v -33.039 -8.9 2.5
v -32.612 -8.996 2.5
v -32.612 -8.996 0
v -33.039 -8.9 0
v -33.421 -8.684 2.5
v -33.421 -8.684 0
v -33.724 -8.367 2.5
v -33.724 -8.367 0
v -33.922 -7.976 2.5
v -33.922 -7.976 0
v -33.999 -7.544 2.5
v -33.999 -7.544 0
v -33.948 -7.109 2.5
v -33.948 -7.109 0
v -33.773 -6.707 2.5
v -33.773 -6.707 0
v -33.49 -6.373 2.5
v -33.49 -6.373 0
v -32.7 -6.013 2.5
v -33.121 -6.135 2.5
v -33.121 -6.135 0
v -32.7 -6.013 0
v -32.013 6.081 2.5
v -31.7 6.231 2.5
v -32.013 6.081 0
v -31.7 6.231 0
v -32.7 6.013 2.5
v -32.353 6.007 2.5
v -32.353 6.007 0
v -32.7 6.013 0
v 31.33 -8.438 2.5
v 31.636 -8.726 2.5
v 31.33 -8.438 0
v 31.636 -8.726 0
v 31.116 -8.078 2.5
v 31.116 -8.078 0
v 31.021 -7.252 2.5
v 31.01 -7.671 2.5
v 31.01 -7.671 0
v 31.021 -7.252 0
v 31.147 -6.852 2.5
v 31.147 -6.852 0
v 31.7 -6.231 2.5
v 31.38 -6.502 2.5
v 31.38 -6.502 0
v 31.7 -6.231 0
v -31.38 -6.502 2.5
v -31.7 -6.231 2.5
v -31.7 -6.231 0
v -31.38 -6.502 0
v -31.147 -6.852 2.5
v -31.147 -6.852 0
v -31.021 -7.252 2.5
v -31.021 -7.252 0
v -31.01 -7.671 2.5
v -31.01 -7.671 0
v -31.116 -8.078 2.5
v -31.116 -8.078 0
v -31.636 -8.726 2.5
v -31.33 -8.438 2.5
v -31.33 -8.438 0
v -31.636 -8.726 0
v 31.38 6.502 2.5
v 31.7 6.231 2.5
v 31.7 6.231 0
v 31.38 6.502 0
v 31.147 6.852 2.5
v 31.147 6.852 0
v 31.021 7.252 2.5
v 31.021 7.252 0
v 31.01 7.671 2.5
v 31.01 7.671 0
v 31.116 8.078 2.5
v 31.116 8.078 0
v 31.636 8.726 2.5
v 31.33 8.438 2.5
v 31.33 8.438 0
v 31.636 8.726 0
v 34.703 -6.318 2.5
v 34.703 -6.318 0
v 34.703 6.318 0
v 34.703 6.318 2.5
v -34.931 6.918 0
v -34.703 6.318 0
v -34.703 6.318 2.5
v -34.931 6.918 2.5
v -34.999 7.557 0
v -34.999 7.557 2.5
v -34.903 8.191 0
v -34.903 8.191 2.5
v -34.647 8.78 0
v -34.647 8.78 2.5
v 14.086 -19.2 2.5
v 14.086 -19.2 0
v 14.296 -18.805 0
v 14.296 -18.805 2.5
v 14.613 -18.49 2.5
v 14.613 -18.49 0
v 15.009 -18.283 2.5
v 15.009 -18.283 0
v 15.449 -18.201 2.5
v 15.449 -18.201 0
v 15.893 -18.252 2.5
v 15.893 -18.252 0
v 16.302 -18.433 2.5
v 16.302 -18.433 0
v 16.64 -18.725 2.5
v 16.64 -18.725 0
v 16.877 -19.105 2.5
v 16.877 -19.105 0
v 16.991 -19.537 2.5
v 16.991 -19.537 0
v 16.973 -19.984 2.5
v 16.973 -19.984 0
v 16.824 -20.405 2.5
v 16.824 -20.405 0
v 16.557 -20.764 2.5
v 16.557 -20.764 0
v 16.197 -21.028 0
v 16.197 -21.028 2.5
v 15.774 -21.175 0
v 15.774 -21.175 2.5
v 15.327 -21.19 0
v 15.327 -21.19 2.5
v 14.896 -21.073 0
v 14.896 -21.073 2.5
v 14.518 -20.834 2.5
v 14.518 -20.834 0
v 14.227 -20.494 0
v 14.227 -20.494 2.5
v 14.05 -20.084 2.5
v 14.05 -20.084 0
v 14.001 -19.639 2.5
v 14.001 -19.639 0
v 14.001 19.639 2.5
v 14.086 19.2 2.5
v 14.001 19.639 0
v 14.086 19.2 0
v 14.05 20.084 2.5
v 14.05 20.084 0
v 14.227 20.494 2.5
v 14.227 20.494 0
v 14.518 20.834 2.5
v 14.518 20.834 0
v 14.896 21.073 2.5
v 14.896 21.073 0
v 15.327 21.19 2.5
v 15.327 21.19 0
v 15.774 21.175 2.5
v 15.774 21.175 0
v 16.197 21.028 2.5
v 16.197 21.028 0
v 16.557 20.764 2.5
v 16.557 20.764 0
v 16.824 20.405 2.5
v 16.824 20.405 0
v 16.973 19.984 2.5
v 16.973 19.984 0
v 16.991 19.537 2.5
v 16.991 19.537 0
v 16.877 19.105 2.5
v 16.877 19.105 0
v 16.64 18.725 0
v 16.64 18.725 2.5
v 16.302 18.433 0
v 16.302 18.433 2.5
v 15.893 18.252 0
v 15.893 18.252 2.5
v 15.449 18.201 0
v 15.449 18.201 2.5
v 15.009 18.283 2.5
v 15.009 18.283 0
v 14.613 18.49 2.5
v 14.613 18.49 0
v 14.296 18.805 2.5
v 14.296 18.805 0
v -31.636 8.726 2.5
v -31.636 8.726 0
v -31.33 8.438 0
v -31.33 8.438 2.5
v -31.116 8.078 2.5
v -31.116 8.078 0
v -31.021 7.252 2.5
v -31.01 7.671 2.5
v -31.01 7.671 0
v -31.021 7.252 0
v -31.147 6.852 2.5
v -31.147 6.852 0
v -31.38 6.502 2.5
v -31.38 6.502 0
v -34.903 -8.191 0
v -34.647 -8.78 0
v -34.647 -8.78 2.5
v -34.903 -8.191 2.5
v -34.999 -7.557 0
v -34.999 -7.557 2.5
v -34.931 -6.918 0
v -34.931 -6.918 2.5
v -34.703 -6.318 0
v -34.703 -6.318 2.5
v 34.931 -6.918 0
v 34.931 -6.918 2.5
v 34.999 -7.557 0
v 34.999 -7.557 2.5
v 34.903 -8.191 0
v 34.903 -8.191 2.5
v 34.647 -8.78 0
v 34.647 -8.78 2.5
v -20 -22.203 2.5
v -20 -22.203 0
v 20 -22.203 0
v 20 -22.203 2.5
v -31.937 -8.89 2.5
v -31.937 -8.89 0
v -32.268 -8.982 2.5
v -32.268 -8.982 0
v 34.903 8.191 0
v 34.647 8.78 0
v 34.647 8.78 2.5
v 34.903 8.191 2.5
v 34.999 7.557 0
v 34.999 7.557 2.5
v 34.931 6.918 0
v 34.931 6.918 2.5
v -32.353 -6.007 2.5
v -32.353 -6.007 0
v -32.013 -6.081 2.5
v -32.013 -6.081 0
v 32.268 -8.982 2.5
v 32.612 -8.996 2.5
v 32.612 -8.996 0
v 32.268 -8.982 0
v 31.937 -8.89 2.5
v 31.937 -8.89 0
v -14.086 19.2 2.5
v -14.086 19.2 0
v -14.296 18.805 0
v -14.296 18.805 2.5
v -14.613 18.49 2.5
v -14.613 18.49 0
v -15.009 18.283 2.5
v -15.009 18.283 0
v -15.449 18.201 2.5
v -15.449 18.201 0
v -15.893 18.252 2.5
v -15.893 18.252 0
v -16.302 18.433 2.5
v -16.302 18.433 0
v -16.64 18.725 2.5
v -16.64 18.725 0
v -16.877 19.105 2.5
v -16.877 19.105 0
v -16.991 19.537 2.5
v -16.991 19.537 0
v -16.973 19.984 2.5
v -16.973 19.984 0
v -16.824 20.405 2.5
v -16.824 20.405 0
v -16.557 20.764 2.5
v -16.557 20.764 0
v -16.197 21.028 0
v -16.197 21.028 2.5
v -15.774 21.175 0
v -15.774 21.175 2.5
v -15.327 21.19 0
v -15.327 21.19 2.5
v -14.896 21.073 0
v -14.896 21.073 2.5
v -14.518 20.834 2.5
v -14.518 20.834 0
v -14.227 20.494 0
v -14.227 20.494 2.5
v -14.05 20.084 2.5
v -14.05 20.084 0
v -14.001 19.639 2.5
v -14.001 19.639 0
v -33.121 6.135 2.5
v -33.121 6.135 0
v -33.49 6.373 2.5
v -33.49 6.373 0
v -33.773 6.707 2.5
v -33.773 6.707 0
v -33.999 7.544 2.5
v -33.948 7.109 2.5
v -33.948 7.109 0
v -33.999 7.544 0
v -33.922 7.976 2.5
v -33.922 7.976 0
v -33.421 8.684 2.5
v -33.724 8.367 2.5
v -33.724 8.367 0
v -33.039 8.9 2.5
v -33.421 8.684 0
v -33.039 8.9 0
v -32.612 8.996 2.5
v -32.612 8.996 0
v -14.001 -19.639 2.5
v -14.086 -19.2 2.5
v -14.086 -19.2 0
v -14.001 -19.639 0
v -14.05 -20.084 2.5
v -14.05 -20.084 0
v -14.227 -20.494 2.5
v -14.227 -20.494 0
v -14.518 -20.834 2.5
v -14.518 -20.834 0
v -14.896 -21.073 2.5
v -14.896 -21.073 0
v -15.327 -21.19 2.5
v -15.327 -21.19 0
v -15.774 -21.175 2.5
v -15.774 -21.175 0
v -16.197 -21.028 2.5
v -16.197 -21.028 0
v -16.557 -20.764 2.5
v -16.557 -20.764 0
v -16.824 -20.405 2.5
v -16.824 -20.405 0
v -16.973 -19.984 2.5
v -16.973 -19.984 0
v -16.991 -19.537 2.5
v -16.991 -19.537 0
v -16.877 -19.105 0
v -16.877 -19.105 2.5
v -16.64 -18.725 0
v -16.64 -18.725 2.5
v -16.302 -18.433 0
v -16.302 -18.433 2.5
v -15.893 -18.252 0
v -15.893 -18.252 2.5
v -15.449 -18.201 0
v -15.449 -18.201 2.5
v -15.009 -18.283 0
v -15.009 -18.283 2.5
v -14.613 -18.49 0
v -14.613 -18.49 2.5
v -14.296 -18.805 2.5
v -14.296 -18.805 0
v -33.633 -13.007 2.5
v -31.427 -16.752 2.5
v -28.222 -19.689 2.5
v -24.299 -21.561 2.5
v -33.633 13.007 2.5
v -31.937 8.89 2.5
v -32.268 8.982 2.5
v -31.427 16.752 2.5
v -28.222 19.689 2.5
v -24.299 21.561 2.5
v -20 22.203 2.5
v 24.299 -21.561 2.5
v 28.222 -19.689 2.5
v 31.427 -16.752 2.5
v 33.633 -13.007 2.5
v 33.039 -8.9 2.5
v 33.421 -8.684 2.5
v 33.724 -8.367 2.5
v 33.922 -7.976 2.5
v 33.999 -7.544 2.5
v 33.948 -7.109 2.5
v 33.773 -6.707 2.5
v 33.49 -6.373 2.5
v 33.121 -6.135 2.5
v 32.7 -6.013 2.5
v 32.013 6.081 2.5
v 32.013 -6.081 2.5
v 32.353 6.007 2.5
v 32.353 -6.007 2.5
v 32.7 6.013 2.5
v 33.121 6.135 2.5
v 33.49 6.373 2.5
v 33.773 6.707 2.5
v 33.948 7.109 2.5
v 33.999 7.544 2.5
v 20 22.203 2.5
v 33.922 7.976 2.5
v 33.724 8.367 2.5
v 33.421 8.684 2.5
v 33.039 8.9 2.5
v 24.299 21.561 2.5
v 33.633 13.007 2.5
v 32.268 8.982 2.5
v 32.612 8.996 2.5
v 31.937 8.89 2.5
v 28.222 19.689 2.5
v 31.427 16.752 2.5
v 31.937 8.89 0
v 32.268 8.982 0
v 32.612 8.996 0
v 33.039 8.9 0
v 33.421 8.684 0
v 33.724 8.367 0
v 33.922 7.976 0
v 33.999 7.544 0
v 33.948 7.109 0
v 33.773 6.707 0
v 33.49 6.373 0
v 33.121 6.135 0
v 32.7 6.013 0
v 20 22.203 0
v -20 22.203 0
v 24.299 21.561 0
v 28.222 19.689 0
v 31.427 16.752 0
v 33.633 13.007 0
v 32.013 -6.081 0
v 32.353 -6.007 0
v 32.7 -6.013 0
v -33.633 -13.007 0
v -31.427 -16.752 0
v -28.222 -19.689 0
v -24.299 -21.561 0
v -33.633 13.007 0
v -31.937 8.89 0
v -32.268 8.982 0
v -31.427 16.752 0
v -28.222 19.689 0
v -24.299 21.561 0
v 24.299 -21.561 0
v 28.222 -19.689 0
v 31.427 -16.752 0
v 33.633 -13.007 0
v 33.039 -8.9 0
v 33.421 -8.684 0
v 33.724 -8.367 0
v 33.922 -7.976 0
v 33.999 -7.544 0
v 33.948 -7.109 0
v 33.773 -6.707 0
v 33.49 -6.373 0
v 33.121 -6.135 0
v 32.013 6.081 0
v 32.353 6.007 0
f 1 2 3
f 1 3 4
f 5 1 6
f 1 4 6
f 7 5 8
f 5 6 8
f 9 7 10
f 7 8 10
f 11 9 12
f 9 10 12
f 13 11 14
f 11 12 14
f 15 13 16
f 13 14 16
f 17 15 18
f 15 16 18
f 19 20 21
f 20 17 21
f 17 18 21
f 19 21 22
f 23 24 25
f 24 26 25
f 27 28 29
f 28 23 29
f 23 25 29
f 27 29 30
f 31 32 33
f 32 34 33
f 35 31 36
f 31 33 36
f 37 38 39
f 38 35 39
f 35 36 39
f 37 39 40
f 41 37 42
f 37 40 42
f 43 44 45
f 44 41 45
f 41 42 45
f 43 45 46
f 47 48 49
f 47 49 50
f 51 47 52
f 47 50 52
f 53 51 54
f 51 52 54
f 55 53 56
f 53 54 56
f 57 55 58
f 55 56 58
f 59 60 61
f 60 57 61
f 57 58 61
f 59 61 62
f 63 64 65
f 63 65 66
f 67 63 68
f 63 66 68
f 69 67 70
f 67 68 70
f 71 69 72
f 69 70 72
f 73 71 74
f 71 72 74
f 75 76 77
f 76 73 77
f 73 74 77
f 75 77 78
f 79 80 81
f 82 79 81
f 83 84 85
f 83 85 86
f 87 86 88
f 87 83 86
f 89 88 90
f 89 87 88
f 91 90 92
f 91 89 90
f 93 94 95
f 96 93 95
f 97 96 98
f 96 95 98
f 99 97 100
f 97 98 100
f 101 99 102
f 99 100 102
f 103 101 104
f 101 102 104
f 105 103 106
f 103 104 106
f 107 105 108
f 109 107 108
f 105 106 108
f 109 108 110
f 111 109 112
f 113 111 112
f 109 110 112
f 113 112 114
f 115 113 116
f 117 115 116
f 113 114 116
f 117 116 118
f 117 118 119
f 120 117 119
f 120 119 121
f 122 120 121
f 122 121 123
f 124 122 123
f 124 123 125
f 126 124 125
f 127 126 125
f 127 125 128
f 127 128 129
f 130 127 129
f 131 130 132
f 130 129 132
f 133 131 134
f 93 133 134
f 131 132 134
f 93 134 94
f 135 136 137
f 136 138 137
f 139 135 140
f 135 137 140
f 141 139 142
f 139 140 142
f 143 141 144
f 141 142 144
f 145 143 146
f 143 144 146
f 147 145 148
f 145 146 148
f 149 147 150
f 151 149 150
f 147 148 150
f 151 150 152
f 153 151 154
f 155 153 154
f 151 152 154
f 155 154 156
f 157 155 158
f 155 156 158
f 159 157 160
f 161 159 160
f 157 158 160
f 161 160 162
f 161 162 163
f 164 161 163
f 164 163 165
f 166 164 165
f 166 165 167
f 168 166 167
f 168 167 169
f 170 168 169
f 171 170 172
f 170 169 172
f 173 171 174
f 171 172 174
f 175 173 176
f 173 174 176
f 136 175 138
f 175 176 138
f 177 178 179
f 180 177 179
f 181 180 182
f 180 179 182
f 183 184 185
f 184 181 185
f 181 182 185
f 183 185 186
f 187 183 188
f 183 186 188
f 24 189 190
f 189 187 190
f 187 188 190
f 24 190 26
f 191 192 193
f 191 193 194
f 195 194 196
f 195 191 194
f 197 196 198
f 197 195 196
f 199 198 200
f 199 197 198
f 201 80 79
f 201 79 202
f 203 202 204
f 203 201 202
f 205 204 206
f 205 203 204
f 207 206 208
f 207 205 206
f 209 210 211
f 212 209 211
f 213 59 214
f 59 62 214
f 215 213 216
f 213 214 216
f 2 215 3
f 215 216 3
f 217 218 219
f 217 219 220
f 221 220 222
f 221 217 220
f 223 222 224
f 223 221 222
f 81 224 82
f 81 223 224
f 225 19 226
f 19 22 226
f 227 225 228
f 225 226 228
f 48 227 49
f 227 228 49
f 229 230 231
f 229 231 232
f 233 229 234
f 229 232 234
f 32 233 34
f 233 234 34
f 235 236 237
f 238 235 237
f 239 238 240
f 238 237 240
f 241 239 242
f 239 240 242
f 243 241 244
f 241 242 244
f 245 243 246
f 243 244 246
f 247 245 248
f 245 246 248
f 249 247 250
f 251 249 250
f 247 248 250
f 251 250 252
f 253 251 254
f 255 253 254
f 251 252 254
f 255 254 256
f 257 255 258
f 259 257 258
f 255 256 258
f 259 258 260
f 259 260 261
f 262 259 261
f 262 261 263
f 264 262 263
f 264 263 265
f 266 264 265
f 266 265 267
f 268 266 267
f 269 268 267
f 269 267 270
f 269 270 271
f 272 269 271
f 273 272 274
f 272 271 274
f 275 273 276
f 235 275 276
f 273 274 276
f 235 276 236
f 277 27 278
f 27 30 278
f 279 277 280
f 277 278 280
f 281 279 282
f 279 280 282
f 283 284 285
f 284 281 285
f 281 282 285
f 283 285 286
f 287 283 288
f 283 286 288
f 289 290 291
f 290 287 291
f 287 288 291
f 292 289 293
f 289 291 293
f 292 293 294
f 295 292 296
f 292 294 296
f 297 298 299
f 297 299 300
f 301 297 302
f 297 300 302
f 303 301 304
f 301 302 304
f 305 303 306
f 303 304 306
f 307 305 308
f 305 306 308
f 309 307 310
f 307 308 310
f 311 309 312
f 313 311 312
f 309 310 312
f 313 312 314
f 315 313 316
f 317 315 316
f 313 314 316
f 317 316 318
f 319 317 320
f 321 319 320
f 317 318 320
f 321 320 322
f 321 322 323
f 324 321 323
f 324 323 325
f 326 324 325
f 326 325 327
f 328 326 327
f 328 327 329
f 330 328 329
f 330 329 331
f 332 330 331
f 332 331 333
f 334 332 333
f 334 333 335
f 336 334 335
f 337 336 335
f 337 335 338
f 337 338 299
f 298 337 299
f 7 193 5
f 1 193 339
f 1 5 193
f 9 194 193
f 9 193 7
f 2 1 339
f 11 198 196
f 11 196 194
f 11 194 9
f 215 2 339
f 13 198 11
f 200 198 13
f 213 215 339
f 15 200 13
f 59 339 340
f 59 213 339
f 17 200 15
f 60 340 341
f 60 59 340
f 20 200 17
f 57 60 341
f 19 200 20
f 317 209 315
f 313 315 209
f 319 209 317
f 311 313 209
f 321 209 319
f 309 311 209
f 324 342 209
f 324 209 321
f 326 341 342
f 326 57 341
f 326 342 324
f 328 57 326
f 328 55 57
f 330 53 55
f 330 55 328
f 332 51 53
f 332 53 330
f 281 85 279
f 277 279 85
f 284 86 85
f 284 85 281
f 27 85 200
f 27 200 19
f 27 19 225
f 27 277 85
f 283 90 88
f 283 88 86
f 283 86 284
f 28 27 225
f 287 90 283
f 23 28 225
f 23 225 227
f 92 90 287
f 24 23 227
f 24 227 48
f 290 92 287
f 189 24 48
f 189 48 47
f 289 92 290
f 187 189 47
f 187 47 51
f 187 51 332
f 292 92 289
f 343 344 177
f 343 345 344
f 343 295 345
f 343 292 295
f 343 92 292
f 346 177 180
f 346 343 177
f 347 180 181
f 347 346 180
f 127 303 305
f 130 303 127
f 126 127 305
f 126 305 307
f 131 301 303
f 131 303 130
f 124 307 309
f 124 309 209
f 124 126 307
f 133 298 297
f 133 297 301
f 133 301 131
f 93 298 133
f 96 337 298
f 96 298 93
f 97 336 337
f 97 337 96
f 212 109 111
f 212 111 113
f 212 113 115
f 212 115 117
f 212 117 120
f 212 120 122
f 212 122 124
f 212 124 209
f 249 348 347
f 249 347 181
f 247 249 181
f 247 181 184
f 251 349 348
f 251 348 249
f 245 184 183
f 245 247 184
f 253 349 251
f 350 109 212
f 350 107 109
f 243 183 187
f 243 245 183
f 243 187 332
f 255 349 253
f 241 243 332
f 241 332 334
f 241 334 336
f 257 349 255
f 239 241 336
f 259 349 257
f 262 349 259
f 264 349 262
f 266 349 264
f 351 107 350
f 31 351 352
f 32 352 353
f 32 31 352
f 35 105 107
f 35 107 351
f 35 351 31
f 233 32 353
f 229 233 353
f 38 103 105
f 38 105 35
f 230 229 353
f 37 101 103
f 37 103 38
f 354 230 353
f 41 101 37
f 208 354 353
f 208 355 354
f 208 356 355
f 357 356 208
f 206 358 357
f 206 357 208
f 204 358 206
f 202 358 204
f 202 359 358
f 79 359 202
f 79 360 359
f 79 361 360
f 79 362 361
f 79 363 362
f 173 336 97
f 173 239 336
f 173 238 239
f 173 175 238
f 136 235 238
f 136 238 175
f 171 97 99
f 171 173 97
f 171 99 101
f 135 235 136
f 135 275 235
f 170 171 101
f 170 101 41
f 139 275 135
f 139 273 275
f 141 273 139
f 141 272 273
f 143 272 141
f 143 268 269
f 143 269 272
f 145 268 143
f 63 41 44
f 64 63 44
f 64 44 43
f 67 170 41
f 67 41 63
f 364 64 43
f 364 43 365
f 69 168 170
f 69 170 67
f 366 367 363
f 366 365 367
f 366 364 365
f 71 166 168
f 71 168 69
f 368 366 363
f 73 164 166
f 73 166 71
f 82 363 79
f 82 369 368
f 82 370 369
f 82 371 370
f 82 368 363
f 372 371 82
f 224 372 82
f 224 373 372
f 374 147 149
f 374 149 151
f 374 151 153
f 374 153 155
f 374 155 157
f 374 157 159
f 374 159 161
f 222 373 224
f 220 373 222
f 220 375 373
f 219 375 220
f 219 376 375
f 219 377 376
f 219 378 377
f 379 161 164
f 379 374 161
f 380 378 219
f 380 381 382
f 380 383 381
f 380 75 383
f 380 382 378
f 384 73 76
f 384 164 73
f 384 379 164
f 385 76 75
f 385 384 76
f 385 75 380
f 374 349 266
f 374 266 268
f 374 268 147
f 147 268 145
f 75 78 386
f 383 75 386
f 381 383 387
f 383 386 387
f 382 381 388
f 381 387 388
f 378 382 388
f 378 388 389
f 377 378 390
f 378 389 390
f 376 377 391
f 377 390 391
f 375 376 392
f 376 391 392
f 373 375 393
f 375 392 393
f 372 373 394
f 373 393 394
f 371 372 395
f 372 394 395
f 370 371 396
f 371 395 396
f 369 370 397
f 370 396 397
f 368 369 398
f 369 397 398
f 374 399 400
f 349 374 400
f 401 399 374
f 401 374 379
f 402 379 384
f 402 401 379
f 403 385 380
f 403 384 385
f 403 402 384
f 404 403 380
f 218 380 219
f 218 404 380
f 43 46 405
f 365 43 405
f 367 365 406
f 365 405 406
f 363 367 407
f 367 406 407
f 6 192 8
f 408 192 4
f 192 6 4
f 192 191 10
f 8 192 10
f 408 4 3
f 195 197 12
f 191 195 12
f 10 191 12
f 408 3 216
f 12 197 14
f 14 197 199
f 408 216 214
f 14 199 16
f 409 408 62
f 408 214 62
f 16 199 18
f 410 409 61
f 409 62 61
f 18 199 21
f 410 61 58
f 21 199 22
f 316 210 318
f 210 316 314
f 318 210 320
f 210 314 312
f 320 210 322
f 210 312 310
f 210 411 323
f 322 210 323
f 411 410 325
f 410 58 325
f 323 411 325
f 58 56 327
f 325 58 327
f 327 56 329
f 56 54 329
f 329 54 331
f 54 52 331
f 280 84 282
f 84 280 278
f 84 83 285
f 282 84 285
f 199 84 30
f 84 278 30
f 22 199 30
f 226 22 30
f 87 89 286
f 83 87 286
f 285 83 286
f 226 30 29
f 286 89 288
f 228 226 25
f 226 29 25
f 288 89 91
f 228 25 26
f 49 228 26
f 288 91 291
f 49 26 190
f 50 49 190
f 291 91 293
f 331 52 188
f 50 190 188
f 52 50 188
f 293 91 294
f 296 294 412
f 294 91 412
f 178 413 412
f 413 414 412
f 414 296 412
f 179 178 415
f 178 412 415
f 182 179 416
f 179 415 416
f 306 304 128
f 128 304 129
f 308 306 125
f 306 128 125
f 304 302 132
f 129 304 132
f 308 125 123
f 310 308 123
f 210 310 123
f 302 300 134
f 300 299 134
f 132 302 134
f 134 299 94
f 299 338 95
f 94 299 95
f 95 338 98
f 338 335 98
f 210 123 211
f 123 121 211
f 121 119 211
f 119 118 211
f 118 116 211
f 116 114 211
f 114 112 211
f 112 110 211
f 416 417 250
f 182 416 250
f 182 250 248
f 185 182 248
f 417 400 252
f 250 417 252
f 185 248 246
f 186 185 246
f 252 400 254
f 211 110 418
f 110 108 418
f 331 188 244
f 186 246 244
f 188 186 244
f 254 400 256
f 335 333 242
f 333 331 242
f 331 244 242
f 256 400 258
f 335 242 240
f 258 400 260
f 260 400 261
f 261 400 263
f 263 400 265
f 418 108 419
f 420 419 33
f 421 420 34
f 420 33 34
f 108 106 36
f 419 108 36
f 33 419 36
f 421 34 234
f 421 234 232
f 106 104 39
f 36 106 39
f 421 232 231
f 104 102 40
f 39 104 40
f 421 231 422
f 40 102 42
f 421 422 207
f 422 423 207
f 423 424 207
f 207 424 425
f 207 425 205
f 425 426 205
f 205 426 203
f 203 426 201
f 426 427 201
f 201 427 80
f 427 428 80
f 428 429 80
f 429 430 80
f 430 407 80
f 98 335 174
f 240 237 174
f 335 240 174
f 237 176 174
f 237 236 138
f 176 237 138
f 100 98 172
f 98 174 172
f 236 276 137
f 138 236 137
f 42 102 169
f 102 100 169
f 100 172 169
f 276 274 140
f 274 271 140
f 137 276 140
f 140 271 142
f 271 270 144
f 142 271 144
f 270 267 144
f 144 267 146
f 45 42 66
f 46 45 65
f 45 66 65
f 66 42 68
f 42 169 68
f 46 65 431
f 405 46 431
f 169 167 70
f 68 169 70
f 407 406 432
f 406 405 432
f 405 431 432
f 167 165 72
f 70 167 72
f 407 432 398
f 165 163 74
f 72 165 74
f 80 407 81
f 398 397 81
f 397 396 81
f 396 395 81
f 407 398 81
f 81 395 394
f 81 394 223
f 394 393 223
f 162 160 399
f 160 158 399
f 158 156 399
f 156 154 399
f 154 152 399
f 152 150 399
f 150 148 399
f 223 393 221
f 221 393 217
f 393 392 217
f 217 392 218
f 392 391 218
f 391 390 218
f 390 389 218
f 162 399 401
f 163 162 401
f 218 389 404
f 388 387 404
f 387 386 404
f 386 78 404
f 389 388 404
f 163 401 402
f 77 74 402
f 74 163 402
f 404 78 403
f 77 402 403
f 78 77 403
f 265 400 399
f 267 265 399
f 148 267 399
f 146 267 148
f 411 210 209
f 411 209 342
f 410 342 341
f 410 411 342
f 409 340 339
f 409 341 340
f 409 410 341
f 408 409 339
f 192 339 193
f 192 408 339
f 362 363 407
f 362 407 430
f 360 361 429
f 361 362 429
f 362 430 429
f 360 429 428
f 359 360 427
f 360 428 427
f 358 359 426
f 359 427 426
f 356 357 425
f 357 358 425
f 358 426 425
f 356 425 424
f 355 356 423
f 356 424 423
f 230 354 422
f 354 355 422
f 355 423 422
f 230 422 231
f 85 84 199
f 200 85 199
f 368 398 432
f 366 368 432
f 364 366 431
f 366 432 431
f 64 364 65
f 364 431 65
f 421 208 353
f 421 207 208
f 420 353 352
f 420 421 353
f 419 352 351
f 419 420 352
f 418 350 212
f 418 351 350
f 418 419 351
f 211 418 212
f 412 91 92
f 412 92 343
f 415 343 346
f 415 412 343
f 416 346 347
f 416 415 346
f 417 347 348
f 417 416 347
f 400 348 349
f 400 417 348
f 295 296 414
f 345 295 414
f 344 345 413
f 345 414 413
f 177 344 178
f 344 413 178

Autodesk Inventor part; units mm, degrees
ref_plane "YZ Plane" through (0, 0, 0) normal (1, 0, 0) x (0, 1, 0)
ref_plane "XZ Plane" through (0, 0, 0) normal (0, 1, 0) x (-1, 0, 0)
ref_plane "XY Plane" through (0, 0, 0) normal (0, 0, 1) x (1, 0, 0)
sketch "Sketch1" plane through (0, 0, 0) normal (0, 0, 1) x (1, 0, 0)
  line L0 (-32.7, -6.0134) -> (-32.7, 6.0134) projected
  arc A0 (-32.6116, 8.9958) -> (-32.7, 6.0134) centre (-32.5, 7.5) ccw projected
  arc A1 (-20, 20.2) -> (-32.6116, 8.9958) centre (-20, 7.5) ccw projected
  line L1 (-20, 20.2) -> (-16.9142, 20.2) projected
  arc A2 (-14.0858, 20.2) -> (-16.9142, 20.2) centre (-15.5, 19.7) ccw projected
  line L2 (-14.0858, 20.2) -> (14.0858, 20.2) projected
  arc A3 (16.9142, 20.2) -> (14.0858, 20.2) centre (15.5, 19.7) ccw projected
  line L3 (16.9142, 20.2) -> (20, 20.2) projected
  arc A4 (32.6116, 8.9958) -> (20, 20.2) centre (20, 7.5) ccw projected
  arc A5 (32.7, 6.0134) -> (32.6116, 8.9958) centre (32.5, 7.5) ccw projected
  line L4 (32.7, 6.0134) -> (32.7, -6.0134) projected
  arc A6 (32.6116, -8.9958) -> (32.7, -6.0134) centre (32.5, -7.5) ccw projected
  arc A7 (20, -20.2) -> (32.6116, -8.9958) centre (20, -7.5) ccw projected
  line L5 (20, -20.2) -> (16.9142, -20.2) projected
  arc A8 (14.0858, -20.2) -> (16.9142, -20.2) centre (15.5, -19.7) ccw projected
  line L6 (14.0858, -20.2) -> (-14.0858, -20.2) projected
  arc A9 (-16.9142, -20.2) -> (-14.0858, -20.2) centre (-15.5, -19.7) ccw projected
  line L7 (-16.9142, -20.2) -> (-20, -20.2) projected
  arc A10 (-32.6116, -8.9958) -> (-20, -20.2) centre (-20, -7.5) ccw projected
  arc A11 (-32.7, -6.0134) -> (-32.6116, -8.9958) centre (-32.5, -7.5) ccw projected
  arc A12 (34.6474, -8.7801) -> (34.7032, -6.3185) centre (32.5, -7.5) ccw projected
  line L8 (34.7032, -6.3185) -> (34.7032, 6.3185) projected
  arc A13 (34.7032, 6.3185) -> (34.6474, 8.7801) centre (32.5, 7.5) ccw projected
  arc A14 (34.6474, 8.7801) -> (20, 22.2032) centre (20, 7.5) ccw projected
  line L9 (20, 22.2032) -> (-20, 22.2032) projected
  arc A15 (-20, 22.2032) -> (-34.6474, 8.7801) centre (-20, 7.5) ccw projected
  arc A16 (-34.6474, 8.7801) -> (-34.7032, 6.3185) centre (-32.5, 7.5) ccw projected
  line L10 (-34.7032, 6.3185) -> (-34.7032, -6.3185) projected
  arc A17 (-34.7032, -6.3185) -> (-34.6474, -8.7801) centre (-32.5, -7.5) ccw projected
  arc A18 (-34.6474, -8.7801) -> (-20, -22.2032) centre (-20, -7.5) ccw projected
  line L11 (-20, -22.2032) -> (20, -22.2032) projected
  arc A19 (20, -22.2032) -> (34.6474, -8.7801) centre (20, -7.5) ccw projected
  arc A20 (-31.6356, 8.7259) -> (-32.6116, 8.9958) centre (-32.5, 7.5) ccw projected
  arc A21 (-20, 19.2) -> (-31.6356, 8.7259) centre (-20, 7.5) ccw projected
  line L12 (-16.9142, 19.2) -> (-20, 19.2) projected
  arc A22 (-16.9142, 20.2) -> (-16.9142, 19.2) centre (-15.5, 19.7) ccw projected
  line L13 (-20, 20.2) -> (-16.9142, 20.2) projected
  arc A23 (-20, 20.2) -> (-32.6116, 8.9958) centre (-20, 7.5) ccw projected
  arc A24 (-32.7, 6.0134) -> (-31.7, 6.2311) centre (-32.5, 7.5) ccw projected
  line L14 (-32.7, -6.0134) -> (-32.7, 6.0134) projected
  arc A25 (-31.7, -6.2311) -> (-32.7, -6.0134) centre (-32.5, -7.5) ccw projected
  line L15 (-31.7, 6.2311) -> (-31.7, -6.2311) projected
  line L16 (-31.7, 6.2311) -> (-31.7, -6.2311) projected
  arc A26 (-31.6356, -8.7259) -> (-31.7, -6.2311) centre (-32.5, -7.5) ccw projected
  arc A27 (-31.6356, -8.7259) -> (-20, -19.2) centre (-20, -7.5) ccw projected
  line L17 (-20, -19.2) -> (-16.9142, -19.2) projected
  arc A28 (-14.0858, -19.2) -> (-16.9142, -19.2) centre (-15.5, -19.7) ccw projected
  line L18 (-14.0858, -19.2) -> (14.0858, -19.2) projected
  arc A29 (16.9142, -19.2) -> (14.0858, -19.2) centre (15.5, -19.7) ccw projected
  line L19 (16.9142, -19.2) -> (20, -19.2) projected
  arc A30 (20, -19.2) -> (31.6356, -8.7259) centre (20, -7.5) ccw projected
  arc A31 (31.7, -6.2311) -> (31.6356, -8.7259) centre (32.5, -7.5) ccw projected
  line L20 (31.7, -6.2311) -> (31.7, 6.2311) projected
  arc A32 (31.6356, 8.7259) -> (31.7, 6.2311) centre (32.5, 7.5) ccw projected
  arc A33 (31.6356, 8.7259) -> (20, 19.2) centre (20, 7.5) ccw projected
  line L21 (20, 19.2) -> (16.9142, 19.2) projected
  arc A34 (14.0858, 19.2) -> (16.9142, 19.2) centre (15.5, 19.7) ccw projected
  line L22 (14.0858, 19.2) -> (-14.0858, 19.2) projected
  arc A35 (-16.9142, 19.2) -> (-14.0858, 19.2) centre (-15.5, 19.7) ccw projected
  line L23 (-16.9142, 19.2) -> (-20, 19.2) projected
  arc A36 (-20, 19.2) -> (-31.6356, 8.7259) centre (-20, 7.5) ccw projected
  arc A37 (-31.7, 6.2311) -> (-31.6356, 8.7259) centre (-32.5, 7.5) ccw projected
  line L24 (-30.1616, -8.3842) -> (-30.2, -6.5202) projected
  line L25 (-30.2, -6.5202) -> (-30.2, 6.5202) projected
  line L26 (-30.2, 6.5202) -> (-30.1616, 8.3842) projected
  arc A38 (-20, 17.7) -> (-30.1616, 8.3842) centre (-20, 7.5) ccw projected
  line L27 (-20, 17.7) -> (20, 17.7) projected
  arc A39 (30.1616, 8.3842) -> (20, 17.7) centre (20, 7.5) ccw projected
  line L28 (30.1616, 8.3842) -> (30.2, 6.5202) projected
  line L29 (30.2, 6.5202) -> (30.2, -6.5202) projected
  line L30 (30.2, -6.5202) -> (30.1616, -8.3842) projected
  arc A40 (20, -17.7) -> (30.1616, -8.3842) centre (20, -7.5) ccw projected
  line L31 (20, -17.7) -> (-20, -17.7) projected
  arc A41 (-30.1616, -8.3842) -> (-20, -17.7) centre (-20, -7.5) ccw projected
  arc A42 (-14.0858, -20.2) -> (-14.0858, -19.2) centre (-15.5, -19.7) ccw projected
  line L32 (14.0858, -20.2) -> (-14.0858, -20.2) projected
  arc A43 (14.0858, -19.2) -> (14.0858, -20.2) centre (15.5, -19.7) ccw projected
  line L33 (-14.0858, -19.2) -> (14.0858, -19.2) projected
  arc A44 (-16.9142, -19.2) -> (-16.9142, -20.2) centre (-15.5, -19.7) ccw projected
  line L34 (-20, -19.2) -> (-16.9142, -19.2) projected
  arc A45 (-31.6356, -8.7259) -> (-20, -19.2) centre (-20, -7.5) ccw projected
  arc A46 (-32.6116, -8.9958) -> (-31.6356, -8.7259) centre (-32.5, -7.5) ccw projected
  arc A47 (-32.6116, -8.9958) -> (-20, -20.2) centre (-20, -7.5) ccw projected
  line L35 (-16.9142, -20.2) -> (-20, -20.2) projected
  arc A48 (31.6356, -8.7259) -> (32.6116, -8.9958) centre (32.5, -7.5) ccw projected
  arc A49 (20, -19.2) -> (31.6356, -8.7259) centre (20, -7.5) ccw projected
  line L36 (16.9142, -19.2) -> (20, -19.2) projected
  arc A50 (16.9142, -20.2) -> (16.9142, -19.2) centre (15.5, -19.7) ccw projected
  line L37 (20, -20.2) -> (16.9142, -20.2) projected
  arc A51 (20, -20.2) -> (32.6116, -8.9958) centre (20, -7.5) ccw projected
  arc A52 (-14.0858, -20.2) -> (-14.0858, -19.2) centre (-15.5, -19.7) ccw projected
  line L38 (14.0858, -20.2) -> (-14.0858, -20.2) projected
  arc A53 (14.0858, -19.2) -> (14.0858, -20.2) centre (15.5, -19.7) ccw projected
  line L39 (-14.0858, -19.2) -> (14.0858, -19.2) projected
  arc A54 (32.7, -6.0134) -> (31.7, -6.2311) centre (32.5, -7.5) ccw projected
  line L40 (32.7, 6.0134) -> (32.7, -6.0134) projected
  arc A55 (31.7, 6.2311) -> (32.7, 6.0134) centre (32.5, 7.5) ccw projected
  line L41 (31.7, -6.2311) -> (31.7, 6.2311) projected
  arc A56 (16.9142, 19.2) -> (16.9142, 20.2) centre (15.5, 19.7) ccw projected
  line L42 (20, 19.2) -> (16.9142, 19.2) projected
  arc A57 (31.6356, 8.7259) -> (20, 19.2) centre (20, 7.5) ccw projected
  arc A58 (32.6116, 8.9958) -> (31.6356, 8.7259) centre (32.5, 7.5) ccw projected
  arc A59 (32.6116, 8.9958) -> (20, 20.2) centre (20, 7.5) ccw projected
  line L43 (16.9142, 20.2) -> (20, 20.2) projected
  arc A60 (14.0858, 20.2) -> (14.0858, 19.2) centre (15.5, 19.7) ccw projected
  line L44 (-14.0858, 20.2) -> (14.0858, 20.2) projected
  arc A61 (-14.0858, 19.2) -> (-14.0858, 20.2) centre (-15.5, 19.7) ccw projected
  line L45 (14.0858, 19.2) -> (-14.0858, 19.2) projected
  point P0 (0, 0)
extrude "Extrusion1" add sketch "Sketch1" along normal blind 2.5 contours L0 A24 L15 A25 | A46 A27 L17 A44 L7 A10 | L15 A37 A21 L12 A35 L22 A34 L21 A33 A32 L20 A31 A30 L19 A29 L18 A28 L17 A27 A26 | A1 L1 A22 L12 A21 A20 | A42 L18 A43 L6 | L2 A60 L22 A61 | A50 L19 A30 A48 A7 L5 | L3 A4 A58 A33 L21 A56 | A54 L20 A55 L4 | A19 L11 A18 A17 L10 A16 A15 L9 A14 A13 L8 A12 | L24 L25 L26 A38 L27 A39 L28 L29 L30 A40 L31 A41
properties part number "front_acryl"
